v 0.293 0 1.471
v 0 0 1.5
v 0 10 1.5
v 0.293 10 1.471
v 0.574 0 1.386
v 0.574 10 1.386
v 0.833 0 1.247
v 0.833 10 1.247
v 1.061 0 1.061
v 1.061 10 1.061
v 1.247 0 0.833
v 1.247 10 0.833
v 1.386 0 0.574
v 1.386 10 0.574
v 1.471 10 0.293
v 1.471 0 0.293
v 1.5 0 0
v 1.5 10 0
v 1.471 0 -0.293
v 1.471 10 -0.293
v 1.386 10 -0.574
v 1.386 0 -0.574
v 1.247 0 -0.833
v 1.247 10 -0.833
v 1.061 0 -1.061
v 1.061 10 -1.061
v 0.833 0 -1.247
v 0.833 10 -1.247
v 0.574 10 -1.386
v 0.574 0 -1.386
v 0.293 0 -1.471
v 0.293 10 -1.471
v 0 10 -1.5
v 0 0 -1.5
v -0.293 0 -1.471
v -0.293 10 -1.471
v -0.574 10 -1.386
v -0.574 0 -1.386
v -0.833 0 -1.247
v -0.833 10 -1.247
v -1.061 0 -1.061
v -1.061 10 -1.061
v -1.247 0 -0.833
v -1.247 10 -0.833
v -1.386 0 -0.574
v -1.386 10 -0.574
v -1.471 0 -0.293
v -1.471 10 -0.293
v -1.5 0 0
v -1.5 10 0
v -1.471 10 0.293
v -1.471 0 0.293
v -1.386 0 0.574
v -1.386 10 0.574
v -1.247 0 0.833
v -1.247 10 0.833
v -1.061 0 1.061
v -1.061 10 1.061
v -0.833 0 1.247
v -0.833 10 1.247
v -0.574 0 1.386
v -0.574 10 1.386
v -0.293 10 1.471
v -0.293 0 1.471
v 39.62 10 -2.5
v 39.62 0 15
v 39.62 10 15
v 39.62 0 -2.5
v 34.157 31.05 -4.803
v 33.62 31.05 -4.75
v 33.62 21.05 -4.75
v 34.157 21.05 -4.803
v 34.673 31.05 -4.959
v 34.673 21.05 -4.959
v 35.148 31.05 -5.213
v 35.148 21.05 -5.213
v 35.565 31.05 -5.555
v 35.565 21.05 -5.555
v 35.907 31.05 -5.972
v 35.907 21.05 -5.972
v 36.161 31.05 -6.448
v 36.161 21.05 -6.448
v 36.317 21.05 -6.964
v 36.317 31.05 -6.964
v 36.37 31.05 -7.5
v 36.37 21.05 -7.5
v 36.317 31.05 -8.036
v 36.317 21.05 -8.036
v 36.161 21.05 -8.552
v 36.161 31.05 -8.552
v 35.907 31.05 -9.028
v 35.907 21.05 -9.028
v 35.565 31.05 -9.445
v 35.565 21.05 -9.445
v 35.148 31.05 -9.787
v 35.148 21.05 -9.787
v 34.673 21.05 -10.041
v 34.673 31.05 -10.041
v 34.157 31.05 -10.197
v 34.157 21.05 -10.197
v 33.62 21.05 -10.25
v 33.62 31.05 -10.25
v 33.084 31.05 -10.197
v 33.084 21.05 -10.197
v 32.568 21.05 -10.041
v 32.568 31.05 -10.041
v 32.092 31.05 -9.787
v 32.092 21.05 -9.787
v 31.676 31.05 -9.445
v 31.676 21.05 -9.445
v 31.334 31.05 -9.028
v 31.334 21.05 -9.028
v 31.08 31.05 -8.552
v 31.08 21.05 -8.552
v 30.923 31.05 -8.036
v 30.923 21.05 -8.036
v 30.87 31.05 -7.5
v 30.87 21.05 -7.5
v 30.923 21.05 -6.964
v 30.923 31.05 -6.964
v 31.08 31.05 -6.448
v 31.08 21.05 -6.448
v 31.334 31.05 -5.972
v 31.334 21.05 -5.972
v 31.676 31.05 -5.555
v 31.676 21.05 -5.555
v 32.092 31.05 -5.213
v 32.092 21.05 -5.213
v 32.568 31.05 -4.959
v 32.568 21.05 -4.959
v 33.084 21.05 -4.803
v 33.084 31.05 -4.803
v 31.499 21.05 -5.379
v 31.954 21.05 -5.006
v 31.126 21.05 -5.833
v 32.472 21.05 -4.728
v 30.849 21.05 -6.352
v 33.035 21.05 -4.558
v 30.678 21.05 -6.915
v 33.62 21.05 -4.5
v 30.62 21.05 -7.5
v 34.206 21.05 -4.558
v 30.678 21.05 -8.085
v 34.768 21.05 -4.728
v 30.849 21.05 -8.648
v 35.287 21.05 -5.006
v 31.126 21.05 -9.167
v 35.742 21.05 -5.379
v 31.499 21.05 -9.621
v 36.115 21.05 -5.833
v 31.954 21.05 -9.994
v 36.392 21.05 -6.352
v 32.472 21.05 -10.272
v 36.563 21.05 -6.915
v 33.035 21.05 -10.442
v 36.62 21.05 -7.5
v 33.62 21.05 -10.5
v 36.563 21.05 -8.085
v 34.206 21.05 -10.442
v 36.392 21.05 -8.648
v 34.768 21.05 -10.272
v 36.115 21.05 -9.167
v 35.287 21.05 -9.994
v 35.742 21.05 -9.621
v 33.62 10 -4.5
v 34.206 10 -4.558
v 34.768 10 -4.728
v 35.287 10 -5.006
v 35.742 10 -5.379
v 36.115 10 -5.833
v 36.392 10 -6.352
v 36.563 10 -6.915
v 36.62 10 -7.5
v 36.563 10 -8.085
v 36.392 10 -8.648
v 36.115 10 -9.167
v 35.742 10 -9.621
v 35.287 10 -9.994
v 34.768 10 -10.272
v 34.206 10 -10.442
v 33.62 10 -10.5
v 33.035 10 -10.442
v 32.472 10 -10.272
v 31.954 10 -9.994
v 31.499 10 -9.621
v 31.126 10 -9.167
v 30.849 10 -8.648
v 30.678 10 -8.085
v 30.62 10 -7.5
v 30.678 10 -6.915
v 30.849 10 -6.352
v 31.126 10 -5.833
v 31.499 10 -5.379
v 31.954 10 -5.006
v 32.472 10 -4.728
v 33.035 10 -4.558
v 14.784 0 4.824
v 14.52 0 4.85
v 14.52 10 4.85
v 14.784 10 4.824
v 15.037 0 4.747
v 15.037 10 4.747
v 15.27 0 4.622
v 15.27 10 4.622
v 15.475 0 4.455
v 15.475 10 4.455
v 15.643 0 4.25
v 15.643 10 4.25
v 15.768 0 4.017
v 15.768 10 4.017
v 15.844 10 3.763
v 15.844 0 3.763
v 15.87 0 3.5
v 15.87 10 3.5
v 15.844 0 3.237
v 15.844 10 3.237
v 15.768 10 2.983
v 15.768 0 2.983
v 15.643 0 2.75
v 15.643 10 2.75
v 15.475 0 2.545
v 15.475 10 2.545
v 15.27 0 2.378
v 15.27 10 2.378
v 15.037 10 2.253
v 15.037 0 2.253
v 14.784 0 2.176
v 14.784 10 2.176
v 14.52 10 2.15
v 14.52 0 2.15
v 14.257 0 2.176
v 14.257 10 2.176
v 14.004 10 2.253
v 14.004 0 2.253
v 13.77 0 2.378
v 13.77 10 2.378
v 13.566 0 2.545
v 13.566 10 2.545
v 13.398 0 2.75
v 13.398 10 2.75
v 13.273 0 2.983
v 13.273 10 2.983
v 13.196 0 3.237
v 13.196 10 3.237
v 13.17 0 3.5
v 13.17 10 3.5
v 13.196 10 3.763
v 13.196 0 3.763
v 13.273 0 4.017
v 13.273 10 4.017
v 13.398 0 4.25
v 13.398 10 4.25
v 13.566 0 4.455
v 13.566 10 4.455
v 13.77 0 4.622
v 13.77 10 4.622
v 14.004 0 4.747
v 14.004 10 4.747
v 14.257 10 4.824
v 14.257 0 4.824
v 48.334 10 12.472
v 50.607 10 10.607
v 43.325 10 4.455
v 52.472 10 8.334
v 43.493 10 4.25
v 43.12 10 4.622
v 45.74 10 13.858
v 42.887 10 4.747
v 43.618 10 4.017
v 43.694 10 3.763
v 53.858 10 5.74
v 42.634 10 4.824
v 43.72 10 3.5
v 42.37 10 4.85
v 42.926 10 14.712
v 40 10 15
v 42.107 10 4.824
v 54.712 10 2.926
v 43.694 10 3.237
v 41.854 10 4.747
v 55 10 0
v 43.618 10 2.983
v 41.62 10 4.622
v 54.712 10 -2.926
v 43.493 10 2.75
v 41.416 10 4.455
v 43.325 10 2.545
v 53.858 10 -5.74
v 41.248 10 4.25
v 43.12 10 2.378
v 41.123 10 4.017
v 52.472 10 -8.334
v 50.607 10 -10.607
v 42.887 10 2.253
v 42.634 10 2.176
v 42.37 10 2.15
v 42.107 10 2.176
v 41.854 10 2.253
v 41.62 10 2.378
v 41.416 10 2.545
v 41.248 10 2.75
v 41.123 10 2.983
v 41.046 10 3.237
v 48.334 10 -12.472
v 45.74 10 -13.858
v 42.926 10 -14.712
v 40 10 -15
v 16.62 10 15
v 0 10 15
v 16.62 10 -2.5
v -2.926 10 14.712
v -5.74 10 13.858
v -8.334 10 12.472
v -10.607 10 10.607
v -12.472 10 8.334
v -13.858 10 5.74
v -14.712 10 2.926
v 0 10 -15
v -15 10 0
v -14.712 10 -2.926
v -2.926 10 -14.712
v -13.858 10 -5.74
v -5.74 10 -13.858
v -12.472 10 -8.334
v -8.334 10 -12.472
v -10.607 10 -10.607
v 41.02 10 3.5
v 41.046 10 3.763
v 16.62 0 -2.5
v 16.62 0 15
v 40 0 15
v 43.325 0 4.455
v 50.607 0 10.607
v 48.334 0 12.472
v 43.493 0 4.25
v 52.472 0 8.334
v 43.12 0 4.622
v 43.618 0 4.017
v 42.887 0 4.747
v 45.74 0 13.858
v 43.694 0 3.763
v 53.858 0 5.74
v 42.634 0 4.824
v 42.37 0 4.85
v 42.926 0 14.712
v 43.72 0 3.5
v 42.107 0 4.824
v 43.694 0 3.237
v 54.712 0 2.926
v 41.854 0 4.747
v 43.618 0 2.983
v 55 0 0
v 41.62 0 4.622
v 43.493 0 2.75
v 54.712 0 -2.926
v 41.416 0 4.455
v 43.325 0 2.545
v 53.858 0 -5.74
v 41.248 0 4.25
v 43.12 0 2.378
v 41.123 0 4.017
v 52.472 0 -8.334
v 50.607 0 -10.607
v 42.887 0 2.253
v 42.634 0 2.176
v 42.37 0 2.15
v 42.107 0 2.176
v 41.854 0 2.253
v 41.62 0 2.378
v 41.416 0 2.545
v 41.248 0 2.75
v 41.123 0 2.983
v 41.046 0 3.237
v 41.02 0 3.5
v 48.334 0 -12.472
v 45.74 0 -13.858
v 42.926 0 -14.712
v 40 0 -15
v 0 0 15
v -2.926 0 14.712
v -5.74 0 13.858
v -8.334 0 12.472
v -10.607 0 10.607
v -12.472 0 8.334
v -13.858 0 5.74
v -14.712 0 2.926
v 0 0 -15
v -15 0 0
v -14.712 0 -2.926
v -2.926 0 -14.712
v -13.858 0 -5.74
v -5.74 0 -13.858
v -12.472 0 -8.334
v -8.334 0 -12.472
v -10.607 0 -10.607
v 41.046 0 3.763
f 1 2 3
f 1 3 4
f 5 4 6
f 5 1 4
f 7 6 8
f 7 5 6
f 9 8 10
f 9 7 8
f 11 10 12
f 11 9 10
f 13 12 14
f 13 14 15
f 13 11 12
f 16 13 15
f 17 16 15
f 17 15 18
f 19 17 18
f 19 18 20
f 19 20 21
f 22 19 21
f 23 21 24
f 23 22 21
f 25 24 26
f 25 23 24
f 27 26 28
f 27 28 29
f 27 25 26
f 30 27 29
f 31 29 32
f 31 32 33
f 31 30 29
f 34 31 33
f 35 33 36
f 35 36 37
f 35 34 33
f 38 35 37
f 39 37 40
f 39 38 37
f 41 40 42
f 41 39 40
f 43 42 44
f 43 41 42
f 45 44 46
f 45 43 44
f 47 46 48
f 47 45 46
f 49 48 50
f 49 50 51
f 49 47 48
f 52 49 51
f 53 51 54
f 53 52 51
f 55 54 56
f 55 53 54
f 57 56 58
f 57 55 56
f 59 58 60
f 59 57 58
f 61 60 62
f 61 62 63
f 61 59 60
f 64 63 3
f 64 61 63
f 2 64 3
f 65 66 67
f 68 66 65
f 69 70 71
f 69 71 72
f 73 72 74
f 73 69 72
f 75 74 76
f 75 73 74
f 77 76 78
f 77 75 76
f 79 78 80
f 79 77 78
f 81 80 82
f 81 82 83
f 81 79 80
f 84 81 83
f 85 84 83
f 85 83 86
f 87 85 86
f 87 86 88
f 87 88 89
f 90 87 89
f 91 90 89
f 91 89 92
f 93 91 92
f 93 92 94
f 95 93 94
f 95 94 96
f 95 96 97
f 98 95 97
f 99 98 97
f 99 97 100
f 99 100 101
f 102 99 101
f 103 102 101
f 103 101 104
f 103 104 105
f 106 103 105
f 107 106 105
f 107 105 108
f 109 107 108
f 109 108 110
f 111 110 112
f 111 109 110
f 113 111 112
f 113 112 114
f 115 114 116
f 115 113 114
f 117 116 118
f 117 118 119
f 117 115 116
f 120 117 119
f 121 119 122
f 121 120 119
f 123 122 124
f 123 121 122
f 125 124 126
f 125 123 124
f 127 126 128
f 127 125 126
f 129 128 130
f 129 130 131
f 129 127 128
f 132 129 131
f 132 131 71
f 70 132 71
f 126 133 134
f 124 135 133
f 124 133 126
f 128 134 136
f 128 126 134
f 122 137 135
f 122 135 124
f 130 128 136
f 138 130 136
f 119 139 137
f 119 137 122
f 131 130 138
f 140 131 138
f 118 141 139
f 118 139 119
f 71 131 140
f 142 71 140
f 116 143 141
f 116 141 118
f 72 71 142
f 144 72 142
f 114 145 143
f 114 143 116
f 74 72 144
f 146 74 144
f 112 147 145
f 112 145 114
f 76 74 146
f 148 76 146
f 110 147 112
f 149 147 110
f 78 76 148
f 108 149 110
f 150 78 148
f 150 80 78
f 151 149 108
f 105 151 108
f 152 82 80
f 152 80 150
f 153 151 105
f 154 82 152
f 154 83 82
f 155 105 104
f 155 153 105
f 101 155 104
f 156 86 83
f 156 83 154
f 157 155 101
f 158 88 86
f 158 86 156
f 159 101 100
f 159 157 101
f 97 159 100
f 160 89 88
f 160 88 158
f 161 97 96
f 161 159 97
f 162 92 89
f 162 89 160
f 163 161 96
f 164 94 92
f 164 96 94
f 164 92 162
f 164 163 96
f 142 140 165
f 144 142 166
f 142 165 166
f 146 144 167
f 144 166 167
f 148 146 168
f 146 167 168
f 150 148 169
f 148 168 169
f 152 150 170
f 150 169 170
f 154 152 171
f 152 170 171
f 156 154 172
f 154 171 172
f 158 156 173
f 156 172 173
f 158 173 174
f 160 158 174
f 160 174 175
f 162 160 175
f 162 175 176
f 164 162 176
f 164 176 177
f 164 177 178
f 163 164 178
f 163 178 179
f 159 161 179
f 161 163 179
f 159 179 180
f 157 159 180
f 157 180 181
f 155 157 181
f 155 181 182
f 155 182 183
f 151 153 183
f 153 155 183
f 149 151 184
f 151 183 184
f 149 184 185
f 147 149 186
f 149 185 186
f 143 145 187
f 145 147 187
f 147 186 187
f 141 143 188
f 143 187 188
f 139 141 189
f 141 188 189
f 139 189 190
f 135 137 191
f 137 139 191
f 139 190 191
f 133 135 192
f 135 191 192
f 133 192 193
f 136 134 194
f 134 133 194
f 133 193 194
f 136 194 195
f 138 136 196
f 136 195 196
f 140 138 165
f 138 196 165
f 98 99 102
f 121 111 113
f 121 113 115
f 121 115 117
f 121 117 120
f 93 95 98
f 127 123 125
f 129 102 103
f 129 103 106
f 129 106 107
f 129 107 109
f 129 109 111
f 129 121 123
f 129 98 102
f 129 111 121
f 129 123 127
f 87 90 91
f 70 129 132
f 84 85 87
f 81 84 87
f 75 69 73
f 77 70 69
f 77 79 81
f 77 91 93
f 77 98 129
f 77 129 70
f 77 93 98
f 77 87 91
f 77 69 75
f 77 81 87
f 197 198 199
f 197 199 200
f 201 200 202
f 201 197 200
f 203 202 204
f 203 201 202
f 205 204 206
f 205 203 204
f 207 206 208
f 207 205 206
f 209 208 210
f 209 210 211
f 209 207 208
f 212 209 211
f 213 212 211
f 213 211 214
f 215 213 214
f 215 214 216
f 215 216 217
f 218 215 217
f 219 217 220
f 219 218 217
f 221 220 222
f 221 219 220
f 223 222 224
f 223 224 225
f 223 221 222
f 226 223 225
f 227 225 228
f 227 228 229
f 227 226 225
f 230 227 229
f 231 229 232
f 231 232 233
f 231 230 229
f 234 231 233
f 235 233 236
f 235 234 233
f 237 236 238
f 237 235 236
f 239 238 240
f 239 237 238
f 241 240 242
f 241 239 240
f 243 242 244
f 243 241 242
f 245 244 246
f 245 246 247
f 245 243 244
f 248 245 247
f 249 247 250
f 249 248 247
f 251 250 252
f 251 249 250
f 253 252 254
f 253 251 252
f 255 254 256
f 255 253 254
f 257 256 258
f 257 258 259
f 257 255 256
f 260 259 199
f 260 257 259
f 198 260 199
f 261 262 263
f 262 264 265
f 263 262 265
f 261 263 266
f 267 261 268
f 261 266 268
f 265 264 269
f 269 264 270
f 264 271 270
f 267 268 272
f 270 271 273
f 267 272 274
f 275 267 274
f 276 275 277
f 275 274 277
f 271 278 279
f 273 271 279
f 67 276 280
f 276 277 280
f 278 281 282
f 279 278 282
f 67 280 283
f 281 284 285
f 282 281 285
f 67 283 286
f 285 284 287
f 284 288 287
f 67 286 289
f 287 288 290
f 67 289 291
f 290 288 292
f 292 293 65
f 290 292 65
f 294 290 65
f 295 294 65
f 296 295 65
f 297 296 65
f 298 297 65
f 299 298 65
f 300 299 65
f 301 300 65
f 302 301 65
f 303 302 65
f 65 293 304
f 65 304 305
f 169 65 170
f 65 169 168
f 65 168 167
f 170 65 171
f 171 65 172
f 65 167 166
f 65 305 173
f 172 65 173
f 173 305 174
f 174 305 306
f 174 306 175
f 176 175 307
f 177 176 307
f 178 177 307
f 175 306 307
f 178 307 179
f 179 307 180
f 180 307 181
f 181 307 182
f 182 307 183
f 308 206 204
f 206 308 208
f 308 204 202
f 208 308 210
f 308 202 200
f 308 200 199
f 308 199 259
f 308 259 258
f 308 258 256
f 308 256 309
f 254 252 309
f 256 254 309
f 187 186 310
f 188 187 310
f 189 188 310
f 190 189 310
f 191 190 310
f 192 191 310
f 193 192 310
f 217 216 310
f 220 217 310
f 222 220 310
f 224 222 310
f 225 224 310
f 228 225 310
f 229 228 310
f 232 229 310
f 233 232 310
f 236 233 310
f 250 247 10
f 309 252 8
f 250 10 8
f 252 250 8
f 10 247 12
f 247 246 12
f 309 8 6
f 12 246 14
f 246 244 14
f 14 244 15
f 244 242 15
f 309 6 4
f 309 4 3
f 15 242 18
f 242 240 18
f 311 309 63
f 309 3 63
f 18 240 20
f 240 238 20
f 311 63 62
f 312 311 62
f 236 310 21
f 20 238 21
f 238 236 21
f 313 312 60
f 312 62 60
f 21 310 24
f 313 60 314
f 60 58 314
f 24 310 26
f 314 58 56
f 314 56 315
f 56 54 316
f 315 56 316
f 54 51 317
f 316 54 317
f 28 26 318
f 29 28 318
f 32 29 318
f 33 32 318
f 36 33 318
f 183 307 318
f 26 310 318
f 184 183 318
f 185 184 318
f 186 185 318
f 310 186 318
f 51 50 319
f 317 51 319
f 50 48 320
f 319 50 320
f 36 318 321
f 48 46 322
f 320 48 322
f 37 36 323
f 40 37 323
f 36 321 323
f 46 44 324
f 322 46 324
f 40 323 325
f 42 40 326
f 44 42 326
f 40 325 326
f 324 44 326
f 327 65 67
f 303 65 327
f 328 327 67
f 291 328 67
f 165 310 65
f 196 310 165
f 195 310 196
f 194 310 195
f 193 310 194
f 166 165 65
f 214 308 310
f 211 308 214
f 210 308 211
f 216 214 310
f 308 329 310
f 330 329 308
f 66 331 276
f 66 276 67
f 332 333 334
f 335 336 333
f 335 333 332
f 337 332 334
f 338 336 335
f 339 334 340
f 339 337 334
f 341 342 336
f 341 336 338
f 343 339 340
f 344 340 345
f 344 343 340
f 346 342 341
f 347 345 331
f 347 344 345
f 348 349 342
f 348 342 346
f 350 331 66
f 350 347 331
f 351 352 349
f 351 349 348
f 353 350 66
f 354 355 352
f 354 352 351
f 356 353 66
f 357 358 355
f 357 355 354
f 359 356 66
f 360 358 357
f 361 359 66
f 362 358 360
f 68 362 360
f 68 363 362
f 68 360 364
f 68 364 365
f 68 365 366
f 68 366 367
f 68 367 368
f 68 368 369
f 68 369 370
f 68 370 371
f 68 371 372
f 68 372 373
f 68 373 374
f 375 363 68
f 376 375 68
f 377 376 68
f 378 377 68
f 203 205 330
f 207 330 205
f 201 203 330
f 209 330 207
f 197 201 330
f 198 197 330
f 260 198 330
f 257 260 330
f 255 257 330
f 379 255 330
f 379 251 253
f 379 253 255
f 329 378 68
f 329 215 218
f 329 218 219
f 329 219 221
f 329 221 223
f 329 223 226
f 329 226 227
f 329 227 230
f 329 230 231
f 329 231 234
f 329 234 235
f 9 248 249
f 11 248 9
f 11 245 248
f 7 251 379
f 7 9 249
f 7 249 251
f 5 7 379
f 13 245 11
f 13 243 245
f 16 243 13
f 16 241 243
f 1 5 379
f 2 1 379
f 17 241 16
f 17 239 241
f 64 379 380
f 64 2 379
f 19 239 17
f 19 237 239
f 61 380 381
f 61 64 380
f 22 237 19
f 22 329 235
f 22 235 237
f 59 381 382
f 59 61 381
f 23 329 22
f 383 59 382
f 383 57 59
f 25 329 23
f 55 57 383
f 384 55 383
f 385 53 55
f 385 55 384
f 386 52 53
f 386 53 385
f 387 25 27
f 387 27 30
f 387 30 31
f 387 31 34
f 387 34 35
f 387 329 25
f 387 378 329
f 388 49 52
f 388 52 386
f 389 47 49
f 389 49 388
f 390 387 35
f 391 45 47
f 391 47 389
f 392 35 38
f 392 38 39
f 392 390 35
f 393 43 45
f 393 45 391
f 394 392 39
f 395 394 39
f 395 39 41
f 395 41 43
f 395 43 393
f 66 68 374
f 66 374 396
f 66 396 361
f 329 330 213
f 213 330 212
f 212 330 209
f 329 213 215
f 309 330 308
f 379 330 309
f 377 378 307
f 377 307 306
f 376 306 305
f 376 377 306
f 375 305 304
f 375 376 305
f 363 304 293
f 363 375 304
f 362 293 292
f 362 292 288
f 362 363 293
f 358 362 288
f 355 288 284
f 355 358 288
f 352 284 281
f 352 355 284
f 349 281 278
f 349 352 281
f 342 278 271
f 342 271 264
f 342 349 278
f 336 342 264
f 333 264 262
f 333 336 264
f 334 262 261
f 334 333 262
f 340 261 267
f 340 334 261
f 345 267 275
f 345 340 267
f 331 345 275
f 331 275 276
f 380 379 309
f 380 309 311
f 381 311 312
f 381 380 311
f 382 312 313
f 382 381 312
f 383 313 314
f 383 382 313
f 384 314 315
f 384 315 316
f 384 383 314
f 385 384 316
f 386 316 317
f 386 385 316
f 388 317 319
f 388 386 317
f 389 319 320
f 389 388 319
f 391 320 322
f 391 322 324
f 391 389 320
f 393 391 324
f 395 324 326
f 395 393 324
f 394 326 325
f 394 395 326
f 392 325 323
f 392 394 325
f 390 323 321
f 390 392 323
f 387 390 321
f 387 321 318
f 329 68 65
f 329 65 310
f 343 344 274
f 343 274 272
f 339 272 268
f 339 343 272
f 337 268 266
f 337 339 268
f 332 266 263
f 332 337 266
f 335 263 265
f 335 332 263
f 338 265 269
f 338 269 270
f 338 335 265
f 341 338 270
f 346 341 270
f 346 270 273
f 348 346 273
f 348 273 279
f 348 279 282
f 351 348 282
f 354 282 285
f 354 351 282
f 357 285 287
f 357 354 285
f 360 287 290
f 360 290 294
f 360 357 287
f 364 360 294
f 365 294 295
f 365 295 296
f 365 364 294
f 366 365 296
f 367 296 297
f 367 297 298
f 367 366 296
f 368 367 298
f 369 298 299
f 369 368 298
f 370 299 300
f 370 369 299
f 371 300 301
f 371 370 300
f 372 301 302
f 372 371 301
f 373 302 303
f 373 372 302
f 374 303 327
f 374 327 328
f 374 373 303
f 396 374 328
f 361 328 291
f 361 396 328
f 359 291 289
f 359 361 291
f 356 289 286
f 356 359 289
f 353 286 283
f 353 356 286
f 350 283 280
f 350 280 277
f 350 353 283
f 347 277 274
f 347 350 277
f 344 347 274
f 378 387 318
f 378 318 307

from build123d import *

# Parameters (mm, degrees)
SKETCH2_R            = 1.5
SKETCH2_R_2          = 1.35
BOSS_EXTRUDE5_DEPTH  = 10
SKETCH6_R            = 3
BOSS_EXTRUDE11_DEPTH = 24.05
SKETCH12_OUTSIDE_W   = 88.684
SKETCH12_OUTSIDE_H   = 48.684
SKETCH12_OUTSIDE_R   = 2.75
CUT_EXTRUDE10_DEPTH  = 13
SKETCH13_R           = 2.75
CUT_EXTRUDE11_DEPTH  = 3


with BuildPart() as part:
    # Sketch2 → Boss-Extrude5 (new body)
    with BuildSketch(Plane(origin=(0, 0, 0), x_dir=(1, 0, 0), z_dir=(0, 1, 0))):
        with BuildLine():
            Line((0, 15), (40, 15))
            ThreePointArc((40, 15), (55, 0), (40, -15))
            Line((40, -15), (39.620269747, -15))
            Line((39.620269747, -15), (39.620269747, -10))
            Line((39.620269747, -10), (39.620269747, 2.5))
            Line((39.620269747, 2.5), (16.620269747, 2.5))
            Line((16.620269747, 2.5), (16.620269747, -10))
            Line((16.620269747, -10), (16.620269747, -15))
            Line((16.620269747, -15), (0, -15))
            ThreePointArc((0, -15), (-15, 0), (0, 15))
        make_face()
        with Locations(Location((0, 0, 0), (0, 0, 270))):
            Circle(SKETCH2_R, mode=Mode.SUBTRACT)
        with Locations(Location((42.370269747, -3.5, 0), (0, 0, 270))):
            Circle(SKETCH2_R_2, mode=Mode.SUBTRACT)
        with Locations(Location((14.520269747, -3.5, 0), (0, 0, 270))):
            Circle(SKETCH2_R_2, mode=Mode.SUBTRACT)
    extrude(amount=BOSS_EXTRUDE5_DEPTH)

    # Sketch6 → Boss-Extrude11 (add)
    with BuildSketch(Plane(origin=(0, 10, 0), x_dir=(1, 0, 0), z_dir=(0, 1, 0))):
        with Locations(Location((33.620269747, 7.5, 0), (0, 0, 270))):
            Circle(SKETCH6_R)
    extrude(amount=BOSS_EXTRUDE11_DEPTH)

    # Sketch12 outside → Cut-Extrude10 (cut)
    with BuildSketch(Plane(origin=(0, 34.05, 0), x_dir=(1, 0, 0), z_dir=(0, 1, 0))):
        with Locations((20, 0)):
            Rectangle(SKETCH12_OUTSIDE_W, SKETCH12_OUTSIDE_H)
        with Locations(Location((33.620269747, 7.5, 0), (0, 0, 270))):
            Circle(SKETCH12_OUTSIDE_R, mode=Mode.SUBTRACT)
    extrude(amount=-CUT_EXTRUDE10_DEPTH, mode=Mode.SUBTRACT)

    # Sketch13 → Cut-Extrude11 (cut)
    with BuildSketch(Plane(origin=(0, 34.05, 0), x_dir=(1, 0, 0), z_dir=(0, 1, 0))):
        with Locations(Location((33.620269747, 7.5, 0), (0, 0, 270))):
            Circle(SKETCH13_R)
    extrude(amount=-CUT_EXTRUDE11_DEPTH, mode=Mode.SUBTRACT)


solid = part.part
